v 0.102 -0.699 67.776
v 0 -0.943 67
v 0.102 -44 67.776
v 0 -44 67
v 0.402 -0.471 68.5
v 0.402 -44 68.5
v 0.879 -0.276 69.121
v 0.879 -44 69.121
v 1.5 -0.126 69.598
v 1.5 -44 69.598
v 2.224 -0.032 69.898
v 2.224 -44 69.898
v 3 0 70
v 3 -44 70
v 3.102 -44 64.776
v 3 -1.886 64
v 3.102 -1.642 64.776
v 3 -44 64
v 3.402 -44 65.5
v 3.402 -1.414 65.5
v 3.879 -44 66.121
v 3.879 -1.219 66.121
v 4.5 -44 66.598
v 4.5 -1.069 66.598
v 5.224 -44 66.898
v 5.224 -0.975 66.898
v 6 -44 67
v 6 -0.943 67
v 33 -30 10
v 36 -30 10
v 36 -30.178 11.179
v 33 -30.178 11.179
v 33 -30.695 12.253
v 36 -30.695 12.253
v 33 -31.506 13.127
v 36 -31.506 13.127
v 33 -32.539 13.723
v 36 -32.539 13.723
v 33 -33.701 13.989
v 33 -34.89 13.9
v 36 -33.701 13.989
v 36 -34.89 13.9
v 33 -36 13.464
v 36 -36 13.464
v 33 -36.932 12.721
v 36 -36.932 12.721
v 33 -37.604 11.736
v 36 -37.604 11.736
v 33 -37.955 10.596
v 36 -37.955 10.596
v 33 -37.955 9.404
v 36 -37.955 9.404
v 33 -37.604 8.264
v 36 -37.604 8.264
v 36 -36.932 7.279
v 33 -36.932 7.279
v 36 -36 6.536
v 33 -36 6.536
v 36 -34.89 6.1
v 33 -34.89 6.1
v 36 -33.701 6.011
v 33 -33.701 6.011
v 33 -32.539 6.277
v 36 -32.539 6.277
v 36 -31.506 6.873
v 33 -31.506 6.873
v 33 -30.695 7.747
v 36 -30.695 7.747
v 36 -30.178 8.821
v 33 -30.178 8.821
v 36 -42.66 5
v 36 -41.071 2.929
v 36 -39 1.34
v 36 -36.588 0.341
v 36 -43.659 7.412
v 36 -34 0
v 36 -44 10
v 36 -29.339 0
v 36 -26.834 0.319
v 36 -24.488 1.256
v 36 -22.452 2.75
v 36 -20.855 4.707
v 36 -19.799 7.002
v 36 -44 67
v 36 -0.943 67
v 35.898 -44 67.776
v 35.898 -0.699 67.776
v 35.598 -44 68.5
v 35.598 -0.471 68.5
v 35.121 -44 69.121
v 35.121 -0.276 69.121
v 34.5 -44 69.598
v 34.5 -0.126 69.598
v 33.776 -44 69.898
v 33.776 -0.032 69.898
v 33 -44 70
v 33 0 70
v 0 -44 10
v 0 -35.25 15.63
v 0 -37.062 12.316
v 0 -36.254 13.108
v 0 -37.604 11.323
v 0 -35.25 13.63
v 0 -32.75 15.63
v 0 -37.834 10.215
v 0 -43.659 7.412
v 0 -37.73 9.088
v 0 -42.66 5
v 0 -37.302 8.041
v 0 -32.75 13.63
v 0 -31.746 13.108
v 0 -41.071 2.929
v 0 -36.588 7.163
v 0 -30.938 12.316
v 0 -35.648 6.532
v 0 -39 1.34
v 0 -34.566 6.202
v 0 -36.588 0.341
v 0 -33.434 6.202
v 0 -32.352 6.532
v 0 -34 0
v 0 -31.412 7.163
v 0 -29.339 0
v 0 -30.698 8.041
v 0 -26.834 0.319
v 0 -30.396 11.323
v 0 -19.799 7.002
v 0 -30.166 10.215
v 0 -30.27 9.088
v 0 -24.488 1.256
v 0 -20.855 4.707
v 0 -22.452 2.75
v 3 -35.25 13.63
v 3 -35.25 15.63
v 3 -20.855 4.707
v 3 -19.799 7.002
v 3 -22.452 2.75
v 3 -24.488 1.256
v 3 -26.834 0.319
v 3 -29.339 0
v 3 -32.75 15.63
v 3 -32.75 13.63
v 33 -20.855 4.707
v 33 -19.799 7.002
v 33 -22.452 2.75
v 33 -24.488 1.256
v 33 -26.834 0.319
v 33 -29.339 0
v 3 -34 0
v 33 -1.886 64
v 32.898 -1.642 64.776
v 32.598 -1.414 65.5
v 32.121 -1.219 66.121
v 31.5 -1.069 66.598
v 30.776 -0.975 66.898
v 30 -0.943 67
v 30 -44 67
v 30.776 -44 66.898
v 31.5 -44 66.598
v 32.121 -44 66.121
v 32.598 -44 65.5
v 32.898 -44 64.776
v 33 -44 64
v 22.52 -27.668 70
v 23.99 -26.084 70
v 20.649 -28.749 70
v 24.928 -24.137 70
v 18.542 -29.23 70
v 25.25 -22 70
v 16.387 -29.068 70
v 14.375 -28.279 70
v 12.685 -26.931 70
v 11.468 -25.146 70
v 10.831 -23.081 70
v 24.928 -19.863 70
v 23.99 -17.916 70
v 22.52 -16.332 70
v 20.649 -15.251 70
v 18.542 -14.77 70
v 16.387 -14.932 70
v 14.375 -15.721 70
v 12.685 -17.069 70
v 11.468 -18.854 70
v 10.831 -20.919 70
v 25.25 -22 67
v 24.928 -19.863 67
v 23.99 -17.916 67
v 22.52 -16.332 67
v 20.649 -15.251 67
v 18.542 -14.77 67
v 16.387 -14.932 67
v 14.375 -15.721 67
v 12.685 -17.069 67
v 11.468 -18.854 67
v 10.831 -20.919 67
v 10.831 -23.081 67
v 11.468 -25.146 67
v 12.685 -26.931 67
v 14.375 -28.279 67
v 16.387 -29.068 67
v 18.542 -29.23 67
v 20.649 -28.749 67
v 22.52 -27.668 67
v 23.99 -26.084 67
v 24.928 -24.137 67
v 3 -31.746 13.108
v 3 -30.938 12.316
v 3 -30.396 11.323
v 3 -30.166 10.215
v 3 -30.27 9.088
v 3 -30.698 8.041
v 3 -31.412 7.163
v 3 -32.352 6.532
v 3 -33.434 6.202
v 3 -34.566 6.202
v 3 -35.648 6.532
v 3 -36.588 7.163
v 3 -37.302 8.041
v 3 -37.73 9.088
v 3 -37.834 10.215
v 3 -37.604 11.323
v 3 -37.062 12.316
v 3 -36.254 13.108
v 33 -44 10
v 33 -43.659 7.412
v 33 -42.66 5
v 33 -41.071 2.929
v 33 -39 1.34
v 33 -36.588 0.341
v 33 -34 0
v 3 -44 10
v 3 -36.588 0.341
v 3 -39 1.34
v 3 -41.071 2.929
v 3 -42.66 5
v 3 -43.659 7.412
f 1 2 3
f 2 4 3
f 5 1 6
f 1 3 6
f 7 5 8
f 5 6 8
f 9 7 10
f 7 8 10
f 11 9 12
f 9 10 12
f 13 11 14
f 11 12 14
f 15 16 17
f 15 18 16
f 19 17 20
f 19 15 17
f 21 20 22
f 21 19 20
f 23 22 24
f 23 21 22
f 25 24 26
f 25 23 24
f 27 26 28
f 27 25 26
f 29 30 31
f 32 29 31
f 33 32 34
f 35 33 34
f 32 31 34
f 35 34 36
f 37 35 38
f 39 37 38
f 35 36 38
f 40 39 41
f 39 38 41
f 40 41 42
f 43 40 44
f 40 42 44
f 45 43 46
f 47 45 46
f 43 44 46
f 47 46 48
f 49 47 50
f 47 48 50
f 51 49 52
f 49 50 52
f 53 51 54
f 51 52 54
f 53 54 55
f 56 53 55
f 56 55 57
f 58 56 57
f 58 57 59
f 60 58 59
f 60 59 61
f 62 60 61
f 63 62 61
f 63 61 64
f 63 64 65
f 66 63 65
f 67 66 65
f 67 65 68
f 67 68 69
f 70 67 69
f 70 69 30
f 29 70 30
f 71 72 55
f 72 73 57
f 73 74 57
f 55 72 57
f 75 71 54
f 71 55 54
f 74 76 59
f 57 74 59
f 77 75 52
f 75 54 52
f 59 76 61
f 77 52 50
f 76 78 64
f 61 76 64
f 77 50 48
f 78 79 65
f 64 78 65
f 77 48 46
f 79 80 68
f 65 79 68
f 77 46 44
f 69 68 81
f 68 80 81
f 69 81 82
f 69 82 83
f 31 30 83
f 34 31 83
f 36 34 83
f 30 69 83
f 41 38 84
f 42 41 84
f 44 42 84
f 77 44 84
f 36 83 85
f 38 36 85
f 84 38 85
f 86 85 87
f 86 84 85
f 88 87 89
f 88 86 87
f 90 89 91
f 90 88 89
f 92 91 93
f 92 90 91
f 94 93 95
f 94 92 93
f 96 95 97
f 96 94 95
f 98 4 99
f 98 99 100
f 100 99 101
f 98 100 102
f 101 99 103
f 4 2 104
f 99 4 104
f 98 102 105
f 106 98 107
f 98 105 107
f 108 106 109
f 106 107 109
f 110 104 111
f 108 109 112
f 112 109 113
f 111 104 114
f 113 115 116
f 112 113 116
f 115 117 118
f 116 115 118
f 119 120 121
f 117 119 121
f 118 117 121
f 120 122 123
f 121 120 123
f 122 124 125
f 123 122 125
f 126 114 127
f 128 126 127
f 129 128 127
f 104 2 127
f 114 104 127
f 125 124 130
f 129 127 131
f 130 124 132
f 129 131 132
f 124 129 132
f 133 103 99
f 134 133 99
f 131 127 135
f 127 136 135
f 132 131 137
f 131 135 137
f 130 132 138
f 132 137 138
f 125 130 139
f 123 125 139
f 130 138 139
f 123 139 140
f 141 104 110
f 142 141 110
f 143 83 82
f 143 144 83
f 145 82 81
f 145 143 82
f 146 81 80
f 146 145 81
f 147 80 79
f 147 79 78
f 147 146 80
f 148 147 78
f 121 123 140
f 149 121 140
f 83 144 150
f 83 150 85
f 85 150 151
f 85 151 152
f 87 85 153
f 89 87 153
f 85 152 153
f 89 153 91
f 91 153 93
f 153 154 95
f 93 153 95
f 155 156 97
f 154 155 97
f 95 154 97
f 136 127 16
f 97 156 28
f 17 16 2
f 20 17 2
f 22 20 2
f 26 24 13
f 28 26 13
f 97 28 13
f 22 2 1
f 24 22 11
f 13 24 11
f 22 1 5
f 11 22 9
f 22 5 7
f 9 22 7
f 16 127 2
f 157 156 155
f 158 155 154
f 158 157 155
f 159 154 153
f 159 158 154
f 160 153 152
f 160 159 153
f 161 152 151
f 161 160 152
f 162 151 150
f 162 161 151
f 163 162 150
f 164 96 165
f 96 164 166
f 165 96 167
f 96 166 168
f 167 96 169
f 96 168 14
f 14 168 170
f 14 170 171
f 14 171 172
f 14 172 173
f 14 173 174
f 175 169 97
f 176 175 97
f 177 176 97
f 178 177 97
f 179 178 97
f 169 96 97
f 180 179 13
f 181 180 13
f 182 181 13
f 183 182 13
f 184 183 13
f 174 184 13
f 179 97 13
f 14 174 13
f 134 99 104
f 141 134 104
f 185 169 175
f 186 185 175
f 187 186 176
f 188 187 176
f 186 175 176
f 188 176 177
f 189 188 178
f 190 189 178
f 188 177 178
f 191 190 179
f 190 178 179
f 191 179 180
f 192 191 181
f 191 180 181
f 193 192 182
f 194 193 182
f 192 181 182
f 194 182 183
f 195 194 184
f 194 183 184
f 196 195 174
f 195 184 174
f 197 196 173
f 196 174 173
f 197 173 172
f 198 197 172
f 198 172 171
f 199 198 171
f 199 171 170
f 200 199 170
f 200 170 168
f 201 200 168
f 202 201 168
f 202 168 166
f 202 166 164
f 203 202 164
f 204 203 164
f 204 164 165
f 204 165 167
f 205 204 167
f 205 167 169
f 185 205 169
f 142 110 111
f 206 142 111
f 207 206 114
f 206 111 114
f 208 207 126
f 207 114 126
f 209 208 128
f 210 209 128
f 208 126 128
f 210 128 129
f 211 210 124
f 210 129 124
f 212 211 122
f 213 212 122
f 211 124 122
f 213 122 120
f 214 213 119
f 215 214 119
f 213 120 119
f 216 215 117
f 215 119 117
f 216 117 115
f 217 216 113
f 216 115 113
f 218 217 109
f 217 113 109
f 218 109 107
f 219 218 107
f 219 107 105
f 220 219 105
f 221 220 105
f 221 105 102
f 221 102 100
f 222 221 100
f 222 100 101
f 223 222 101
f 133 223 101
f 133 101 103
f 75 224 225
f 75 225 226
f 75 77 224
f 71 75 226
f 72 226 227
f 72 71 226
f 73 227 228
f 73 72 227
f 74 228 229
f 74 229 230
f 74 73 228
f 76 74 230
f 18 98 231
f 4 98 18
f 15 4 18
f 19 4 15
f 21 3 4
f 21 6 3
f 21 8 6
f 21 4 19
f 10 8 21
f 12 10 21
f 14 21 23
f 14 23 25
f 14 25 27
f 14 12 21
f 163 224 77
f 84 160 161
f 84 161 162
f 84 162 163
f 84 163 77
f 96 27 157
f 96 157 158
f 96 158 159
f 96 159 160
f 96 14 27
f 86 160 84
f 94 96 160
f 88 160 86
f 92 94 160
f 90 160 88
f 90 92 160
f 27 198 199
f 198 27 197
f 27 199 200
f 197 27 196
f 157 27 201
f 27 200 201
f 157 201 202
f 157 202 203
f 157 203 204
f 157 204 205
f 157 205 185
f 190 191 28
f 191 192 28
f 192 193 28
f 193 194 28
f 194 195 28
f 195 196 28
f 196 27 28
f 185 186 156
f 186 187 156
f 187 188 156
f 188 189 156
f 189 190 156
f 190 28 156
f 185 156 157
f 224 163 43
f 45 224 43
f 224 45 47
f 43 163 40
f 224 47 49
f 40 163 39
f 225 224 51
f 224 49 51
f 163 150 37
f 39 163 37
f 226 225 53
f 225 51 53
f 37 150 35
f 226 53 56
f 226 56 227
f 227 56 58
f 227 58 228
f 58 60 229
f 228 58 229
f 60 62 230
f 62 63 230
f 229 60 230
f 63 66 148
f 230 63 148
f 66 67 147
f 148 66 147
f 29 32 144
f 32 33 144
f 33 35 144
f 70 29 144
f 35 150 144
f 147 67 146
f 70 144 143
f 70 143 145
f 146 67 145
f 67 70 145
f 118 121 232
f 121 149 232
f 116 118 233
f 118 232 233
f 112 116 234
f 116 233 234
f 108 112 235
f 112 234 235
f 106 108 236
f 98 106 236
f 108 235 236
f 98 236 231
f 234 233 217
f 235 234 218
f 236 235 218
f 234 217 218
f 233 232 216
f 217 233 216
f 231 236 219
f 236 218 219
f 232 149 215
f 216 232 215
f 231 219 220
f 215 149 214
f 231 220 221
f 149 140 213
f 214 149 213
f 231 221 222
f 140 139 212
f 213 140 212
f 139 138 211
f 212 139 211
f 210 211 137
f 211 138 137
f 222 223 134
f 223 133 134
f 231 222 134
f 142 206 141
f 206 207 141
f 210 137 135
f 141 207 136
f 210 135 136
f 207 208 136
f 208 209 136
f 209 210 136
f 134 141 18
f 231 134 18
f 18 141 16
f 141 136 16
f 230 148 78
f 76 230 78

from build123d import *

# Parameters (mm, degrees)
F1_DEPTH = 44
F2_R     = 4
F3_DEPTH = 25
F5_DEPTH = 25
F6_R     = 3
F7_R     = 10
F8_R     = 7.25
F9_DEPTH = 25


with BuildPart() as f1:
    # F0 (on Front) → F1 (new body)
    with BuildSketch(Plane.XZ):
        Polygon((0, 70), (0, 0), (3, 0), (3, 67), (33, 67), (33, 0), (36, 0), (36, 70), align=None)
    extrude(amount=F1_DEPTH)

    # F2 (on face) → F3 (cut)
    with BuildSketch(Plane.YZ.offset(36)):
        with Locations((-34, 10)):
            Circle(F2_R)
        Polygon((0, 0), (0, 70), (-22, 0), align=None)
    extrude(amount=-F3_DEPTH, mode=Mode.SUBTRACT)

    # F4 (on face) → F5 (cut)
    with BuildSketch(Plane(origin=(0, 0, 0), x_dir=(0, -1, 0), z_dir=(-1, 0, 0))):
        Polygon((22, 0), (0, 70), (0, 0), align=None)
        with BuildLine():
            Line((32.75, 15.6304840334), (32.75, 13.6304840334))
            ThreePointArc((32.75, 13.6304840334), (34, 6.1603497142), (35.25, 13.6304840334))
            Line((35.25, 13.6304840334), (35.25, 15.6304840334))
            Line((35.25, 15.6304840334), (32.75, 15.6304840334))
        make_face()
    extrude(amount=-F5_DEPTH, mode=Mode.SUBTRACT)

    # F6
    f6_edges = [f1.edges().sort_by_distance(p)[0] for p in [
        (33, -22.471429, 67),
        (3, -22.471429, 67),
        (36, -22, 70),
        (0, -22, 70),
    ]]
    fillet(f6_edges, radius=F6_R)

    # F7
    f7_edges = [f1.edges().sort_by_distance(p)[0] for p in [
        (1.5, -22, 0),
        (1.5, -44, 0),
        (34.5, -44, 0),
        (34.5, -22, 0),
    ]]
    fillet(f7_edges, radius=F7_R)

    # F8 (on face) → F9 (cut)
    with BuildSketch(Plane.XY.offset(70)):
        with Locations((18, -22)):
            Circle(F8_R)
    extrude(amount=-F9_DEPTH, mode=Mode.SUBTRACT)


solid = f1.part
